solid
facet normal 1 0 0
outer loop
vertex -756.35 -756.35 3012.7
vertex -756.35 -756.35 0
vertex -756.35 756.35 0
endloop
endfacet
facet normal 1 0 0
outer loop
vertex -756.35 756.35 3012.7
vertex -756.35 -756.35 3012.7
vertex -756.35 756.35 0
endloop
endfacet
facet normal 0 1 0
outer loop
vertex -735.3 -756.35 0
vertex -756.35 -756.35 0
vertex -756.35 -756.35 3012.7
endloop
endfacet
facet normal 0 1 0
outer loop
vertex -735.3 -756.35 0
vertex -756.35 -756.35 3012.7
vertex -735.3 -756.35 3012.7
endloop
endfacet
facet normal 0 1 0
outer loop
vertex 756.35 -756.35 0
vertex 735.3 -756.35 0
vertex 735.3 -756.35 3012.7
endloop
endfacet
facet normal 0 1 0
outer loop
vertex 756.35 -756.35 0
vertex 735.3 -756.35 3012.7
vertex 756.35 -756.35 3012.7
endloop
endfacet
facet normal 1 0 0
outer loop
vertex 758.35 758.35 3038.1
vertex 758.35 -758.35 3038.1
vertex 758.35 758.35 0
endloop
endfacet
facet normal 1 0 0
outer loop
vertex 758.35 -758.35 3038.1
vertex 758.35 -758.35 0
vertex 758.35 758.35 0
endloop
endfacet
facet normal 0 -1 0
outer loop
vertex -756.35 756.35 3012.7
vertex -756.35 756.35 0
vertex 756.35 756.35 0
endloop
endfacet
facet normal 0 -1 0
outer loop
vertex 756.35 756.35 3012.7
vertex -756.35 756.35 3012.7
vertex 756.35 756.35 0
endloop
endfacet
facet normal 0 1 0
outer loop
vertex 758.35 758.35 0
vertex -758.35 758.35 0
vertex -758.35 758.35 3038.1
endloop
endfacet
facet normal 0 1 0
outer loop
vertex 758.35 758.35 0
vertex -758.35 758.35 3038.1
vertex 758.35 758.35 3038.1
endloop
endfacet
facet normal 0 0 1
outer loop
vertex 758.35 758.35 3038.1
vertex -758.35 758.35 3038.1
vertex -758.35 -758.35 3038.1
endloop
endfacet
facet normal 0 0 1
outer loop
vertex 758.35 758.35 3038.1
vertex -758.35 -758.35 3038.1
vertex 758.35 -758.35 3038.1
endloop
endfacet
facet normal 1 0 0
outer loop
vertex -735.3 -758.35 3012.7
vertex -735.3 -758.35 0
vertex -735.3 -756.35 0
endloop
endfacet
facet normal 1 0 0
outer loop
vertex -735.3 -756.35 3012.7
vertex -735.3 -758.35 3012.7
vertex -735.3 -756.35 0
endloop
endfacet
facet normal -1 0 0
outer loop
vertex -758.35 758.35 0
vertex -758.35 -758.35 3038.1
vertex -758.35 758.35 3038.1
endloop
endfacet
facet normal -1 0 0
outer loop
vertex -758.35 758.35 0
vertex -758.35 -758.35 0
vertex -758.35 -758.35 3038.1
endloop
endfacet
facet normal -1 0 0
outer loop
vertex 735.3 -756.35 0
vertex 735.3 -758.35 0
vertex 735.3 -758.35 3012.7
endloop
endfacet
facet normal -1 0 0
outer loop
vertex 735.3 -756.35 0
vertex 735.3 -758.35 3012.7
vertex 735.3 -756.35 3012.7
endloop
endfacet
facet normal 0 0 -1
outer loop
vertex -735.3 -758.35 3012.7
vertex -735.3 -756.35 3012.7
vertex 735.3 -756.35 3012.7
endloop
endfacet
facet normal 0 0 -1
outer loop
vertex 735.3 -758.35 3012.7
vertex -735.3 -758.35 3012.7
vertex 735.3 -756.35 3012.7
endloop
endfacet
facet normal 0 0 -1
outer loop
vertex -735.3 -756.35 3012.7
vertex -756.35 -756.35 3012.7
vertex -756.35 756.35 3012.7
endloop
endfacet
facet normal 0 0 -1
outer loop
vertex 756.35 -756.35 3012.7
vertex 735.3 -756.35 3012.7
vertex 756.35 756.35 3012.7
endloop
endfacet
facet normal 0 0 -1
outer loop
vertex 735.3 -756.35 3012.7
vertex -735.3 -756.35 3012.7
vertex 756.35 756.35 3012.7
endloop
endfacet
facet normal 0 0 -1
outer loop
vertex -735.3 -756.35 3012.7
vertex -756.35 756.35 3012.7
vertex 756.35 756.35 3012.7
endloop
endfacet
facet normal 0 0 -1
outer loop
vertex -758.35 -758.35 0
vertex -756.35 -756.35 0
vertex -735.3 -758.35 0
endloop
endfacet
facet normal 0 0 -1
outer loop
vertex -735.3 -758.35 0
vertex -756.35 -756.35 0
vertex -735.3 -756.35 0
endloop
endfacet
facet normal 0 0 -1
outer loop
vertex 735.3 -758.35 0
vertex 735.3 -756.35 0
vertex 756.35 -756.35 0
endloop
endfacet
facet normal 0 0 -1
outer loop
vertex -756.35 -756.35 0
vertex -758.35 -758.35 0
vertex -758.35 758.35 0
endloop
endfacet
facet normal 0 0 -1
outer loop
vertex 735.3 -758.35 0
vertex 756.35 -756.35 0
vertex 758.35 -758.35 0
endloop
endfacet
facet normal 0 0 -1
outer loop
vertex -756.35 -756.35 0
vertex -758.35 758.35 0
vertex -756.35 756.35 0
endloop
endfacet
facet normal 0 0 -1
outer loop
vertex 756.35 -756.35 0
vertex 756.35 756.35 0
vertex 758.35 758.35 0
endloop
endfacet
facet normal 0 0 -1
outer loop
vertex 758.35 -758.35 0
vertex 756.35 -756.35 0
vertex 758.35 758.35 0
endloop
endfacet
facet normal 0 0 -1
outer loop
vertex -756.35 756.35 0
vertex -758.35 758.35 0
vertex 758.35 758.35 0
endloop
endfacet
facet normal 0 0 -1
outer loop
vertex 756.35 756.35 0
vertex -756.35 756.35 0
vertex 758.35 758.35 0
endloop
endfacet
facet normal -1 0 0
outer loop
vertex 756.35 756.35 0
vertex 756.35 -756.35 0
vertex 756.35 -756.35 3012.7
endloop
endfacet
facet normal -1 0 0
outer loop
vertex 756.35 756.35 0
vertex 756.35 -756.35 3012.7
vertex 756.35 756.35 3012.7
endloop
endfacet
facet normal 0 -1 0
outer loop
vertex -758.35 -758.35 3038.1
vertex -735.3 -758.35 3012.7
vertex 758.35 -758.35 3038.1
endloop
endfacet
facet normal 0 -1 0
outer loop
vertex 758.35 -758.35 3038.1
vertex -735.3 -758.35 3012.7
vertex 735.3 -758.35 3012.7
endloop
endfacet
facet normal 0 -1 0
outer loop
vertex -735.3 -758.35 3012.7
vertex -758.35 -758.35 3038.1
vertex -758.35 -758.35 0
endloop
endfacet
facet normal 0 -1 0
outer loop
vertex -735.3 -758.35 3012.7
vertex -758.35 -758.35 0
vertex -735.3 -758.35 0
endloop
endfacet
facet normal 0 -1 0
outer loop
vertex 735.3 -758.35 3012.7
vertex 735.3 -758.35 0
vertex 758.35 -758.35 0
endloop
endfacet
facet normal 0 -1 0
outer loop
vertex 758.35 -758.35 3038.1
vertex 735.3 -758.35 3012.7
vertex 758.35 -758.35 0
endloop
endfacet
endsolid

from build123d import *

# Parameters (mm, degrees)
F0_W     = 1516.7
F0_H     = 1516.7
F0_W_2   = 1512.7
F0_H_2   = 1512.7
F2_DEPTH = 3012.7
F5_W     = 1470.6
F5_H     = 2
F6_DEPTH = 3014.7
F8_W     = 1516.7
F8_H     = 1516.7
F9_DEPTH = 25.4


with BuildPart() as f2:
    # F0 (on Top) → F2 (new body)
    with BuildSketch(Plane.XY):
        Rectangle(F0_W, F0_H)
        Rectangle(F0_W_2, F0_H_2, mode=Mode.SUBTRACT)
    extrude(amount=F2_DEPTH)


with BuildPart() as f6:
    # F5 (on Top) → F6 (new body)
    with BuildSketch(Plane.XY):
        with Locations((0, -757.35)):
            Rectangle(F5_W, F5_H)
    extrude(amount=F6_DEPTH)


with BuildPart() as f2_1:
    add(f2.part)

    # F7: cut F6
    add(f6.part, mode=Mode.SUBTRACT)

    # F8 (on offset) → F9 (join)
    with BuildSketch(Plane.XY.offset(3012.7)):
        Rectangle(F8_W, F8_H)
    extrude(amount=F9_DEPTH)


solid = f2_1.part
